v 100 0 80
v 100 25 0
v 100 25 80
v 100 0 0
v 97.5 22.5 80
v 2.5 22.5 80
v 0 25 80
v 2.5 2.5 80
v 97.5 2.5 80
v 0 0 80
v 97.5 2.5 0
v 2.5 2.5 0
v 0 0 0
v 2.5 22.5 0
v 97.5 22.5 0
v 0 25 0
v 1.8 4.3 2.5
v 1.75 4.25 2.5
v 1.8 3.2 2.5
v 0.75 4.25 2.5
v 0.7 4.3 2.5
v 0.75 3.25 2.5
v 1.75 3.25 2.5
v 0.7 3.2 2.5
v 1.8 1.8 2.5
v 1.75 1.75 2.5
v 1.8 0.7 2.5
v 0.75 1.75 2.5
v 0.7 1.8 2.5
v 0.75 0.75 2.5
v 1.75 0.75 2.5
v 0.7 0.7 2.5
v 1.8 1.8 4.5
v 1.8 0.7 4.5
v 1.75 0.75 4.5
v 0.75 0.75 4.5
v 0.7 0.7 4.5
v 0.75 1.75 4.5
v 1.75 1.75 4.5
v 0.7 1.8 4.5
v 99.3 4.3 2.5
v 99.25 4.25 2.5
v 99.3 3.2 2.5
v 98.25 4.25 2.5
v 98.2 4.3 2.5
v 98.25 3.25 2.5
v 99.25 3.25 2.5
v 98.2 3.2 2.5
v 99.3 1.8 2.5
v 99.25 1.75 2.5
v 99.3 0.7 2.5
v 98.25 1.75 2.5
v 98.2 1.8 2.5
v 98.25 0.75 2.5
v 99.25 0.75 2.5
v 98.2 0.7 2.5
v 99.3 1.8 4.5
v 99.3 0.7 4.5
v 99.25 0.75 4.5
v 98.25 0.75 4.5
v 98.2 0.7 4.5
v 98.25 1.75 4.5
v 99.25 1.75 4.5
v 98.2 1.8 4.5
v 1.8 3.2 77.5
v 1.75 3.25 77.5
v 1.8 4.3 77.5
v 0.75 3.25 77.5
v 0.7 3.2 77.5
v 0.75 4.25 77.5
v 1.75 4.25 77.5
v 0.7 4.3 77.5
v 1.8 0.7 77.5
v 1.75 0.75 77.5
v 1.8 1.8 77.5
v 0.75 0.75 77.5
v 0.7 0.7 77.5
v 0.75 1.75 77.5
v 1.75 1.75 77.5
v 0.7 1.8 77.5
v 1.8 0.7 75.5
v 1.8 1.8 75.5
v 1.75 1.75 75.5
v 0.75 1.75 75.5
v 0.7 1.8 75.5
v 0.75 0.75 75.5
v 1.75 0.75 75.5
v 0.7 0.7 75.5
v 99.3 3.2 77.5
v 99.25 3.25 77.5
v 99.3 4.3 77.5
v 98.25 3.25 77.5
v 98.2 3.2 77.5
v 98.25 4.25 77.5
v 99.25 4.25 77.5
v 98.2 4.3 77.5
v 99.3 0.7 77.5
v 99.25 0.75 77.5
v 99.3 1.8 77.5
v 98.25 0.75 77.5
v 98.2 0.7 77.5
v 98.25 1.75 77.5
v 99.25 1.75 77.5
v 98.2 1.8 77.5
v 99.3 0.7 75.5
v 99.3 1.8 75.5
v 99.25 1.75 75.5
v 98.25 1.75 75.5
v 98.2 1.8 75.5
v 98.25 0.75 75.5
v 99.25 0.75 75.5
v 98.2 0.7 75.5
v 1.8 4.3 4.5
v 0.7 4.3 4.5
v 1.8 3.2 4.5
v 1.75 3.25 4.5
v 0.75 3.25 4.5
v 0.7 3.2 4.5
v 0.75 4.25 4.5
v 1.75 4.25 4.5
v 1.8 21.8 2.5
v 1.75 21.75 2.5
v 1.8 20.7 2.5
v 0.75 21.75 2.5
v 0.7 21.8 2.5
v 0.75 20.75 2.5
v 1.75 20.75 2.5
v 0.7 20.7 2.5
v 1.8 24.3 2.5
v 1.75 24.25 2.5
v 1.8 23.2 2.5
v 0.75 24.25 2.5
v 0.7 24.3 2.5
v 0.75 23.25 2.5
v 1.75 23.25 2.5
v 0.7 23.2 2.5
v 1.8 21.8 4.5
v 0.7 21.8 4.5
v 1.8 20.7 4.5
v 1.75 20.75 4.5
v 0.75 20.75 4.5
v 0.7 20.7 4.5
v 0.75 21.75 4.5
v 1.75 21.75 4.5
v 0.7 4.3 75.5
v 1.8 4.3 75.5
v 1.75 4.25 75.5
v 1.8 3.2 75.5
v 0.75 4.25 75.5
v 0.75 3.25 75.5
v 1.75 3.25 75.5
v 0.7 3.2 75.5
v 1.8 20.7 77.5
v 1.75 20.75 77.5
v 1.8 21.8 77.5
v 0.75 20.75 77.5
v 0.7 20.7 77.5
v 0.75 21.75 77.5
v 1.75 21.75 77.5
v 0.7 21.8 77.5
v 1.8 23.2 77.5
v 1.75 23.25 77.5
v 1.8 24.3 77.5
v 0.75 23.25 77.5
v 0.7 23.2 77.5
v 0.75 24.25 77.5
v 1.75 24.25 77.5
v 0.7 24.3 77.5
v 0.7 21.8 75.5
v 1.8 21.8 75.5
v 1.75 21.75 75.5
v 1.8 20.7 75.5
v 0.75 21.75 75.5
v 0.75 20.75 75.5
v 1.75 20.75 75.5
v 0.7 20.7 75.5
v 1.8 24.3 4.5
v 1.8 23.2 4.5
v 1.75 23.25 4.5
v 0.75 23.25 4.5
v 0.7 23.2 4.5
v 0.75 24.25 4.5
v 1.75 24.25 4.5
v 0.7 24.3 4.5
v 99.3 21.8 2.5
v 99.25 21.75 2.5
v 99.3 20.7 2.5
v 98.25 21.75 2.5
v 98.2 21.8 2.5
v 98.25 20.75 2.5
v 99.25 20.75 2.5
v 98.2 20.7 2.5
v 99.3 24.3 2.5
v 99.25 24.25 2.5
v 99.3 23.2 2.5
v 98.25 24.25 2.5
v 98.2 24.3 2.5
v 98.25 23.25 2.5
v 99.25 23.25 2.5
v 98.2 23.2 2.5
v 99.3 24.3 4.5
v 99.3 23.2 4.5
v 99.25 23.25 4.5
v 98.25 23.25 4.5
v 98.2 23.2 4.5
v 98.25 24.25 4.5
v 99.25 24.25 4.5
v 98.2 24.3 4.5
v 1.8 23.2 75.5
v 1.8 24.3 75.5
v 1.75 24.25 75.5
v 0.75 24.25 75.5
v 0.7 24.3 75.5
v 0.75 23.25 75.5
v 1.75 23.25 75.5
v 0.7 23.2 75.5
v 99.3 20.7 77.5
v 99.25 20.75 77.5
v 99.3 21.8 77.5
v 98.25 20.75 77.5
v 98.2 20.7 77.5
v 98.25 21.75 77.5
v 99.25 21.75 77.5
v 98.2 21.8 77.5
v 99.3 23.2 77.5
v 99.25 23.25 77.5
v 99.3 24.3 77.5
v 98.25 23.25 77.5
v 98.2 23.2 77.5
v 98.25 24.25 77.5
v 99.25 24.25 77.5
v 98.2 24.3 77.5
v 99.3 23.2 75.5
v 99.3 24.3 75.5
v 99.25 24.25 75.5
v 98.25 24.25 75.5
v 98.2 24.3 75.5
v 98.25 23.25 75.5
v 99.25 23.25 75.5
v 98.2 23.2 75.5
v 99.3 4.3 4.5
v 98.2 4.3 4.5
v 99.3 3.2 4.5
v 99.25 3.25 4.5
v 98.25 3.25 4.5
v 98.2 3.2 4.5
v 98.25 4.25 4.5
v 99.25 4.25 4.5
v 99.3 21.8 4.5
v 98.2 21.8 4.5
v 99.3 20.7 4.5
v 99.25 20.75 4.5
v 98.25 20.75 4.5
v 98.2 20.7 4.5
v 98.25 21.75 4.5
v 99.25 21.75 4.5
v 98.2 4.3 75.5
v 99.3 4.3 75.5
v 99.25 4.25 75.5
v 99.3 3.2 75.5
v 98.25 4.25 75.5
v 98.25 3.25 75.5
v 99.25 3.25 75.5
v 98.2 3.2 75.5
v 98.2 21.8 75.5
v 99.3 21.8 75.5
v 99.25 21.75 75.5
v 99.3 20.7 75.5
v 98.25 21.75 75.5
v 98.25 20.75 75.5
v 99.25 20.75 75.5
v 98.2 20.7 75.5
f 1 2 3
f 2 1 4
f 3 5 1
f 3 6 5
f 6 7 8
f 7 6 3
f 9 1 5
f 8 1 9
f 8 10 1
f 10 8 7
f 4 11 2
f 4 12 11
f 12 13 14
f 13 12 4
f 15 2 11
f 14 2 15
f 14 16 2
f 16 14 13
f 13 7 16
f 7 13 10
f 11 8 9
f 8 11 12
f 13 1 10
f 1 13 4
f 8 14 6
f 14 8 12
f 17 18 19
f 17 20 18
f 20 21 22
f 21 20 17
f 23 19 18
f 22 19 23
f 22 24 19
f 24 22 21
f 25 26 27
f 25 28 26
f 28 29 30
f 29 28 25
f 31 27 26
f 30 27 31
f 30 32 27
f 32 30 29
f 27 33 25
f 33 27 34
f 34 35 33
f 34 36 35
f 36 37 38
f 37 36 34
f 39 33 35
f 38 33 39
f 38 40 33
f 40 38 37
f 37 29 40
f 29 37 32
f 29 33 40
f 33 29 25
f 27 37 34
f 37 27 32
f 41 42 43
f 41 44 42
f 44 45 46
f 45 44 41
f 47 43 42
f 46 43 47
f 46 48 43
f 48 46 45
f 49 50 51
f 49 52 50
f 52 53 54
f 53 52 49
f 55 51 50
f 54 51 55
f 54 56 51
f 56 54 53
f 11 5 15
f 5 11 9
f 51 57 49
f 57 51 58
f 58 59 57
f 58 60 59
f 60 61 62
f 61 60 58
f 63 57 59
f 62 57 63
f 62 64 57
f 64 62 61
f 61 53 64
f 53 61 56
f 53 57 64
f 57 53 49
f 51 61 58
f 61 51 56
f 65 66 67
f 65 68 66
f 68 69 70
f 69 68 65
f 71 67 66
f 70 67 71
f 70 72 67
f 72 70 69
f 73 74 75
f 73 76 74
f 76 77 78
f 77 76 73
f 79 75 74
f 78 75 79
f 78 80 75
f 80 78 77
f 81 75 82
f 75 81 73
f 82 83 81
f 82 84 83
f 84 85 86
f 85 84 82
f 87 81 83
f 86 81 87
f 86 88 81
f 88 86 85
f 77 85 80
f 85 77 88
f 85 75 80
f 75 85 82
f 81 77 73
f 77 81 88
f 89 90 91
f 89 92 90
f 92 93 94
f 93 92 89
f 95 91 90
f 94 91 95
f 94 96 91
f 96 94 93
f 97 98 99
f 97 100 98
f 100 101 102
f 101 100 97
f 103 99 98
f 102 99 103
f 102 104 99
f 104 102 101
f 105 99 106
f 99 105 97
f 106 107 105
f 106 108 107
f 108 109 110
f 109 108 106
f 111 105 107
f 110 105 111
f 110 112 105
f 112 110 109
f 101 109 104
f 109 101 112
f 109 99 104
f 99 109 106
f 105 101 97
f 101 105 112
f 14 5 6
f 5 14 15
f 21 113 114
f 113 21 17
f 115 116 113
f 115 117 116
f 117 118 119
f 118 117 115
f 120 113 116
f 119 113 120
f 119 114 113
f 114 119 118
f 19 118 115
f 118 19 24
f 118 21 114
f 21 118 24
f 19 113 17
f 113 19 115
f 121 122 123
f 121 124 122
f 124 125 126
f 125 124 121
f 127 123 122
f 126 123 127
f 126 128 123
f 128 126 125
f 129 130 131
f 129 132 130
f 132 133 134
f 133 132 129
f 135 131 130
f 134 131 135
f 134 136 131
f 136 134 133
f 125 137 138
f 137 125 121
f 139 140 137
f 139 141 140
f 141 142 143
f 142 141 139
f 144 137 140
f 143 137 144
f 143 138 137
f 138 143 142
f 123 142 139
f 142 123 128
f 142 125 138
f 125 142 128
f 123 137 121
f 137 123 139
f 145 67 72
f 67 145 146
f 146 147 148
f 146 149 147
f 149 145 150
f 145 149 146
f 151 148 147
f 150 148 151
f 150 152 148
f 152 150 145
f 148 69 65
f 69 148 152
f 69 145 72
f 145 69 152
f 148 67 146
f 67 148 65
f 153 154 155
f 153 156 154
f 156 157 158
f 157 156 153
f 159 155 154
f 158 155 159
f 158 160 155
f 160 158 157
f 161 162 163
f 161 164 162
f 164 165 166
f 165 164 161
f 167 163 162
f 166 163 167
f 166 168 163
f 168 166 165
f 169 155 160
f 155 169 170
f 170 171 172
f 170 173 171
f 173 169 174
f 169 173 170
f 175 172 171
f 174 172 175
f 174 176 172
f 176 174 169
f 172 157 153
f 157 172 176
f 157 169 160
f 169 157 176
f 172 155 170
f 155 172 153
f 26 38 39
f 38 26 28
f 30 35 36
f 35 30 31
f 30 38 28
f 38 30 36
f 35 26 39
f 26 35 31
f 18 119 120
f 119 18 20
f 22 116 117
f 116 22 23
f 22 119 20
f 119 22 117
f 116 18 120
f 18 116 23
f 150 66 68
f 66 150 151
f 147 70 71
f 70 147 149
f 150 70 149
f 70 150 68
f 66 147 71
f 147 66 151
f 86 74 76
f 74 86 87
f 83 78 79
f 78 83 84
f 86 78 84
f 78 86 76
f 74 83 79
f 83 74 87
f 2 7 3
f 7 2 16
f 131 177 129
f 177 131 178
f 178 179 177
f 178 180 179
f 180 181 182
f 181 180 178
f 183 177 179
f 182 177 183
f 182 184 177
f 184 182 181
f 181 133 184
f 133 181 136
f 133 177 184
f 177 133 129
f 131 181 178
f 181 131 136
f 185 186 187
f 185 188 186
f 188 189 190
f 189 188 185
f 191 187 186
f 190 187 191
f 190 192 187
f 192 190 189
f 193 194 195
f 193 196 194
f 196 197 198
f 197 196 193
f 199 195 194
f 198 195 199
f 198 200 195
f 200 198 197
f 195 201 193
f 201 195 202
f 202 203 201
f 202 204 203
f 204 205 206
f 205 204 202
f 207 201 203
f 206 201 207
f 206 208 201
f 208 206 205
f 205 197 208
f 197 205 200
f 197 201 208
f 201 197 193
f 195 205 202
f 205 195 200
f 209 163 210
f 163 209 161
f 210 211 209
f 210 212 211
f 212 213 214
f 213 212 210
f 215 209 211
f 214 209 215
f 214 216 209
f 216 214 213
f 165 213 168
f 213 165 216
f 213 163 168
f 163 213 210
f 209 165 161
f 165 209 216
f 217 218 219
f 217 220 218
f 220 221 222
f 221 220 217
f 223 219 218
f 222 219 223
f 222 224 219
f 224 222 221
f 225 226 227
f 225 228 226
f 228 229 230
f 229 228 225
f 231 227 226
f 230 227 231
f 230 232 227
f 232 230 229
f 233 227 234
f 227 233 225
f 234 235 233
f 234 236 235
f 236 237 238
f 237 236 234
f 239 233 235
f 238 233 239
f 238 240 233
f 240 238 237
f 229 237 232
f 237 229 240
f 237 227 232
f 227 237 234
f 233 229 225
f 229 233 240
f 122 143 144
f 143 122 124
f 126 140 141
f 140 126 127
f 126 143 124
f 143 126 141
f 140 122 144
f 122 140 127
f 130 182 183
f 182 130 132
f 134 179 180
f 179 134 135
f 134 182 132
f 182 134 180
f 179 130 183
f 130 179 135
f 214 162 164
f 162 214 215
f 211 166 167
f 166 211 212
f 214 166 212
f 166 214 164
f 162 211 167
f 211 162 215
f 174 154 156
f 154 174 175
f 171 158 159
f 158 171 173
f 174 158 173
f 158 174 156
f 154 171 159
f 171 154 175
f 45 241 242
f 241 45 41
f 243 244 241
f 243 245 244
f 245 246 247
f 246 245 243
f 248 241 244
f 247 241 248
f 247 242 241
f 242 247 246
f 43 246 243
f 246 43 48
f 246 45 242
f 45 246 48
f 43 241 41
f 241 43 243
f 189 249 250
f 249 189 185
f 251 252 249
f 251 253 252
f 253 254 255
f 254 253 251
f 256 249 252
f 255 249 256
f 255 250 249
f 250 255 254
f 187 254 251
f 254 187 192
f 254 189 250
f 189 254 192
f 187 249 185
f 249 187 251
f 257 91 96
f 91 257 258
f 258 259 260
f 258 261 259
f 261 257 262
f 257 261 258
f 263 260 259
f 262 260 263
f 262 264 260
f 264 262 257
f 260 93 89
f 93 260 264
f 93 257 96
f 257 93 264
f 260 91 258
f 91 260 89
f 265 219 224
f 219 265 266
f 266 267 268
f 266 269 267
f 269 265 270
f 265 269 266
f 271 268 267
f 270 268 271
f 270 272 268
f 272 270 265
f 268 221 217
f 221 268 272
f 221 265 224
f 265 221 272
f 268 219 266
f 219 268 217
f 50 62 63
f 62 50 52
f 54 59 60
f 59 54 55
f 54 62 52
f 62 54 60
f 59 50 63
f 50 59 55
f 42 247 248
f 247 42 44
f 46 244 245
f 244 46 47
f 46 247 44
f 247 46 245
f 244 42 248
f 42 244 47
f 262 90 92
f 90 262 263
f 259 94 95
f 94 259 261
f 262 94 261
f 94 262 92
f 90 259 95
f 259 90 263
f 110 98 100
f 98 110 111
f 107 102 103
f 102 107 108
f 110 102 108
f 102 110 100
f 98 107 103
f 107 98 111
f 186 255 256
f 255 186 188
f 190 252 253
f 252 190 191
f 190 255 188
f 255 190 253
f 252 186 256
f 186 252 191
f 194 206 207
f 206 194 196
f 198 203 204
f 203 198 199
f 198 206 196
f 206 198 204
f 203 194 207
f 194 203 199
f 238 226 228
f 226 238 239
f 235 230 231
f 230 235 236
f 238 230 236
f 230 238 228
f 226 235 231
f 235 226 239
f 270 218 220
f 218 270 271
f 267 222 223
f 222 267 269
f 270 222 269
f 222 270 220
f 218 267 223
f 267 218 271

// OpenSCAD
// file: cornerPin.scad
module cornerPin(thickness = 2.5, pinSize = 1, pinDepth = 2) {
  cube([thickness * 2, thickness, thickness]);

  pinOffset = (thickness - pinSize) / 2;

  translate([pinOffset, pinOffset, thickness])
  cube([pinSize, pinSize, pinDepth]);

  translate([thickness + pinOffset, pinOffset, thickness])
  cube([pinSize, pinSize, pinDepth]);
}
// file: wall.scad
module wall(length, height = 80, thickness = 2.5, pinSize = 1, pinDepth = 2, pinPlay = .1) {
  difference() {
    cube([length, thickness, height]);

    pinSize = pinSize + pinPlay;
    pinOffset = (thickness - pinSize) / 2;

    // Bottom-left cut-out
    translate([-1, -1, -1])
    cube([thickness + 1, thickness + 2, thickness + 1]);

    // Bottom-left pin
    translate([pinOffset, pinOffset, thickness - 1])
    cube([pinSize, pinSize, pinDepth + 1]);

    // Bottom-right cut-out
    translate([length - thickness, -1, -1])
    cube([thickness + 1, thickness + 2, thickness + 1]);

    // Bottom-right pin
    translate([length - thickness + pinOffset, pinOffset, thickness - 1])
    cube([pinSize, pinSize, pinDepth + 1]);

    // Top-left cut-out
    translate([-1, -1, height - thickness])
    cube([thickness + 1, thickness + 2, thickness + 1]);

    // Top-left pin
    translate([pinOffset, pinOffset, height - thickness - pinDepth])
    cube([pinSize, pinSize, pinDepth + 1]);

    // Top-right cut-out
    translate([length - thickness, -1, height - thickness])
    cube([thickness + 1, thickness + 2, thickness + 1]);

    // Top-right pin
    translate([length - thickness + pinOffset, pinOffset, height - thickness - pinDepth])
    cube([pinSize, pinSize, pinDepth + 1]);
  }
}
// main file
include <wall.scad>;
include <cornerPin.scad>;

// Front wall
wall(100);

// Left wall
rotate([0, 0, 90])
translate([2.5, -2.5, 0])
wall(20);

// Bottom corner pin
rotate([0, 0, 90])
translate([0, -2.5, 0])
cornerPin();

// Top corner pin
translate([2.5, 5, 80])
rotate([0, 180, 90])
cornerPin();

// Back wall
translate([0, 20 + 2.5, 0])
wall(100);

// Bottom corner pin
rotate([0, 0, 90])
translate([20, -2.5, 0])
cornerPin();

// Top corner pin
translate([2.5, 20 + 5, 80])
rotate([0, 180, 90])
cornerPin();

// Right wall
rotate([0, 0, 90])
translate([2.5, -100, 0])
wall(20);

// Bottom corner pin
rotate([0, 0, 90])
translate([0, -100, 0])
cornerPin();

// Top corner pin
translate([100, 5, 80])
rotate([0, 180, 90])
cornerPin();

// Bottom corner pin
rotate([0, 0, 90])
translate([20, -100, 0])
cornerPin();

// Top corner pin
translate([100, 20 + 5, 80])
rotate([0, 180, 90])
cornerPin();
